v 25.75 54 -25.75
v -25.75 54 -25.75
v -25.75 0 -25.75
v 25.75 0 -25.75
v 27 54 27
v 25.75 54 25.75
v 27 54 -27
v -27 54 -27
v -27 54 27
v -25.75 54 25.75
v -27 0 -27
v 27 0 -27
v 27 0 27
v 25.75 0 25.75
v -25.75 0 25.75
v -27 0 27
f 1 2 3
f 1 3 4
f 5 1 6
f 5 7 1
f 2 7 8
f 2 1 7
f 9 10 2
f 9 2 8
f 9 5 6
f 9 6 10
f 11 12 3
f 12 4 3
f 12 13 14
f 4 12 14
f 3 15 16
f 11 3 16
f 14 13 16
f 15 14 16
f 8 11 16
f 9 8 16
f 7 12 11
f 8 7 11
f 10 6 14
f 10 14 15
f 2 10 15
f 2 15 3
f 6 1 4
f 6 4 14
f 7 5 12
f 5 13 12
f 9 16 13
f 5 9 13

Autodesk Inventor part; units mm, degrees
ref_plane "YZ Plane" through (0, 0, 0) normal (1, 0, 0) x (0, 1, 0)
ref_plane "XZ Plane" through (0, 0, 0) normal (0, 1, 0) x (-1, 0, 0)
ref_plane "XY Plane" through (0, 0, 0) normal (0, 0, 1) x (1, 0, 0)
sketch "Sketch2" plane through (0, 0, 0) normal (0, 1, 0) x (-1, 0, 0)
  line L0 (27, 27) -> (-27, 27)
  line L1 (-27, 27) -> (-27, -27)
  line L2 (-27, -27) -> (27, -27)
  line L3 (27, -27) -> (27, 27)
  line L4 (27, 27) -> (-27, -27) construction
  line L5 (-27, 27) -> (27, -27) construction
  line L6 (25.75, -25.75) -> (-25.75, -25.75)
  line L7 (-25.75, -25.75) -> (-25.75, 25.75)
  line L8 (-25.75, 25.75) -> (25.75, 25.75)
  line L9 (25.75, 25.75) -> (25.75, -25.75)
  dimension "d31" = 54
  dimension "d32" = 54
  dimension "d43" = 1.25
extrude "Extrusion5" add sketch "Sketch2" along normal blind 54
properties part number "Cube" material "ABS Plastic"
